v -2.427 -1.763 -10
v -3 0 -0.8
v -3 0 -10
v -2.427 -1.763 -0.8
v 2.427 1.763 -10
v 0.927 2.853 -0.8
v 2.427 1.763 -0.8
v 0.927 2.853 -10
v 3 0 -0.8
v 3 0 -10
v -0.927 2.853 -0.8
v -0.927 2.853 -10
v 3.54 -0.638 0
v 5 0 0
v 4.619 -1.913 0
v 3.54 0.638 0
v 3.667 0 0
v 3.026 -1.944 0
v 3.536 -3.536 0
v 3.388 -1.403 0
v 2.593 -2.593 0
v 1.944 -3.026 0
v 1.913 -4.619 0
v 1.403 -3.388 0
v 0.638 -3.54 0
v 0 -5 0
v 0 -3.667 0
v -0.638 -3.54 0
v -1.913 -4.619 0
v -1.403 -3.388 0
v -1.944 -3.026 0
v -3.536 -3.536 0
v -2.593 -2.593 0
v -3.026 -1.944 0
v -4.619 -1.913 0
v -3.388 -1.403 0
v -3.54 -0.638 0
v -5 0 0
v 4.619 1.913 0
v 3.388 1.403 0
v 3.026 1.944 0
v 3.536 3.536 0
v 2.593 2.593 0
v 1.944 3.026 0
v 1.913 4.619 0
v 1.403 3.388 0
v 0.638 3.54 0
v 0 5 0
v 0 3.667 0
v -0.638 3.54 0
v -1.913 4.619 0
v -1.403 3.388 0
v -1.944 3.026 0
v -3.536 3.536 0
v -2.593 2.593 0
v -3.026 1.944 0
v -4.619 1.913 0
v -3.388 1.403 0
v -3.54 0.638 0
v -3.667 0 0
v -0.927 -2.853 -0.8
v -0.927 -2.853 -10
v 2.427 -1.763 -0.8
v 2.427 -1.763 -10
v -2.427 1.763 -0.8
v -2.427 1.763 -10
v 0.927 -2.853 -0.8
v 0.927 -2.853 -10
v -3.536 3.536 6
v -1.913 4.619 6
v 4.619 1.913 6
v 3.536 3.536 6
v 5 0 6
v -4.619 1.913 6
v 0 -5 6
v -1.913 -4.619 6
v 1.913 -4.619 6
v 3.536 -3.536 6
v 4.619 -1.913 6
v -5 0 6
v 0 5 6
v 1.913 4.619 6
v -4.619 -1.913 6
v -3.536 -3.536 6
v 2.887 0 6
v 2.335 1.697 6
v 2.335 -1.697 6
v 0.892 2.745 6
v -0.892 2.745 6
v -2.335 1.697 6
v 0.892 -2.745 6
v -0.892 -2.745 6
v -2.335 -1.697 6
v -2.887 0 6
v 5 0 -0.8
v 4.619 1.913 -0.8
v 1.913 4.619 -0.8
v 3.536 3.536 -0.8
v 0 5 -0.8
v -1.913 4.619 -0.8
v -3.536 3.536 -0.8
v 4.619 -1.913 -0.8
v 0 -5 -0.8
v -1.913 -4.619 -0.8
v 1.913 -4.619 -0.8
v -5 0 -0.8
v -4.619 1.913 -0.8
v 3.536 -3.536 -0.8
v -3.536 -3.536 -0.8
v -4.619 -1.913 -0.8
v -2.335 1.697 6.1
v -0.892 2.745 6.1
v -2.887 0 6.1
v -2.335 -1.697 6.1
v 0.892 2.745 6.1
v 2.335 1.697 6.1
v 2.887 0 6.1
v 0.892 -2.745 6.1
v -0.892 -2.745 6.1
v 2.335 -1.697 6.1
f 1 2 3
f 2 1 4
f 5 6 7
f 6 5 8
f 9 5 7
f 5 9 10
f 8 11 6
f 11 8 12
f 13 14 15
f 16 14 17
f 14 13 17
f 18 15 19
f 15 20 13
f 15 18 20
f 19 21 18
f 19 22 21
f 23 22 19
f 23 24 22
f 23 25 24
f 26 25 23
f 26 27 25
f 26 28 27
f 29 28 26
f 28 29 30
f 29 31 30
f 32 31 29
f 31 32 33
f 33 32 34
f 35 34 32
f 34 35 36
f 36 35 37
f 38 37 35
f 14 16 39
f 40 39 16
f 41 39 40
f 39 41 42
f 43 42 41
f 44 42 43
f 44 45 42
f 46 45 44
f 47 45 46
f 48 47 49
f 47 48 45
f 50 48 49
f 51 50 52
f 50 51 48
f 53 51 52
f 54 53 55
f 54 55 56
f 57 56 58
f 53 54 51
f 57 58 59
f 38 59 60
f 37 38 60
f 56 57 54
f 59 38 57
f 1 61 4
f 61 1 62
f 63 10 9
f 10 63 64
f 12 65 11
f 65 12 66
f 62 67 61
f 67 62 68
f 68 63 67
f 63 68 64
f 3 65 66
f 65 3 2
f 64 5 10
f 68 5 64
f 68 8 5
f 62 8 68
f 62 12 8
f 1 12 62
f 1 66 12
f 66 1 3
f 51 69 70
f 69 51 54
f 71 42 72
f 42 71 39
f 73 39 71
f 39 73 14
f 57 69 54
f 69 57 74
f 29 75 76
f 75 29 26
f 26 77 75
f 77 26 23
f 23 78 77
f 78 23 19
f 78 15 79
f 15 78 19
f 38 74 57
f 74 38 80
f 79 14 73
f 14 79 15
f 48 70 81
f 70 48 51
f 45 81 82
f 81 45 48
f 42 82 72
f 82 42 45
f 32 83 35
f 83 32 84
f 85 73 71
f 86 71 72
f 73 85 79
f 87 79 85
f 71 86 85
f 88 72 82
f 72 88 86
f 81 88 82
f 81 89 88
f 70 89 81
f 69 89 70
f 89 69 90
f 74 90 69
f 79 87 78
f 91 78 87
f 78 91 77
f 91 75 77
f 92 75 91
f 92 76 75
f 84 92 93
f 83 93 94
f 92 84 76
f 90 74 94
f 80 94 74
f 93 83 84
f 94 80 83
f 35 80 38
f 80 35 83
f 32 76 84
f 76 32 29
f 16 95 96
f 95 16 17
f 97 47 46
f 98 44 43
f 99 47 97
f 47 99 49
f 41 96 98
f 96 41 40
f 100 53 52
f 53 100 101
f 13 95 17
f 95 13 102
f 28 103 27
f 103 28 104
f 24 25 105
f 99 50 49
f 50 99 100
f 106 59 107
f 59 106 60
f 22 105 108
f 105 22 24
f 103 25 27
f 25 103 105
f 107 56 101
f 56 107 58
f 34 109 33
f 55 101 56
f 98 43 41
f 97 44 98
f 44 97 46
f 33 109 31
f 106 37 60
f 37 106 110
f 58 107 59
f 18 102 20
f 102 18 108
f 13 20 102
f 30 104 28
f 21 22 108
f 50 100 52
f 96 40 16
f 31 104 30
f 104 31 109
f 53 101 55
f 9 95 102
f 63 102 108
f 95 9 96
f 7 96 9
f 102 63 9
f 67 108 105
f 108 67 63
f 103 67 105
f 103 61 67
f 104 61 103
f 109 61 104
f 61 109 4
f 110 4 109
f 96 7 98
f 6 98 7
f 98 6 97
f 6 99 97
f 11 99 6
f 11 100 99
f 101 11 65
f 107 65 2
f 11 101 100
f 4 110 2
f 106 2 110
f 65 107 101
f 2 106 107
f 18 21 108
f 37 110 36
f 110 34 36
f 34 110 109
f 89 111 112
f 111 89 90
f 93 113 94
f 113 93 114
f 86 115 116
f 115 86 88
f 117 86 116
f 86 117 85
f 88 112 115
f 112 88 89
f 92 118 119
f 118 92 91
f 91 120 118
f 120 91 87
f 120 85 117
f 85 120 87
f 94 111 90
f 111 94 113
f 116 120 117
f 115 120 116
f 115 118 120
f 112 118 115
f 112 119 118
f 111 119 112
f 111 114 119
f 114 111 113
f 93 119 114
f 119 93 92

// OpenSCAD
// Parameters
shaft_diameter_mm = 6; //[3:12:0.1]
length_under_head_mm = 10; //[5:20:0.5]
head_diameter_mm = 10; //[6:20:0.1]
head_height_mm = 6; //[3:12:0.1]
socket_across_flats_mm = 5; //[3:8:0.1]
socket_depth_mm = 4; //[2:6:0.1]
threaded = 1; //[0:1:1]
thread_pitch_mm = 1; //[0.5:2:0.1]
thread_depth_mm = 0.3; //[0.1:0.8:0.05]
under_head_fillet_height_mm = 1.2; //[0.6:2.4:0.1]
overlap_mm = 0.8; //[0.2:2:0.1]
eps_mm = 0.2; //[0.05:0.5:0.05]
placeholder_size_mm = 0.01; //[0.001:0.1:0.001]

// Pin Socket - Detailed Geometry
module pin_socket() {
  color("Silver") {
    // Placeholder for pin socket geometry
    translate([0, 0, -length_under_head_mm + placeholder_size_mm/2])
      cube([placeholder_size_mm, placeholder_size_mm, placeholder_size_mm], center=true);
  }
}

// Screw And Washer - Detailed Geometry
module screw_and_washer() {
  color("DimGray") {
    // Placeholder for screw and washer geometry
    translate([0, 0, head_height_mm - placeholder_size_mm/2])
      cube([placeholder_size_mm, placeholder_size_mm, placeholder_size_mm], center=true);
  }
}

// PCB Spacer - Detailed Geometry
module pcb_spacer() {
  color("Black") {
    // Placeholder for PCB spacer geometry
    translate([0, 0, -length_under_head_mm/2])
      cube([placeholder_size_mm, placeholder_size_mm, placeholder_size_mm], center=true);
  }
}

// Buzzer - Detailed Geometry
module buzzer() {
  color("Copper") {
    // Placeholder for buzzer geometry
    translate([0, 0, head_height_mm/2])
      cube([placeholder_size_mm, placeholder_size_mm, placeholder_size_mm], center=true);
  }
}

// Screw with Thread and Socket
module screw_with_thread_and_socket() {
  color("Steel") {
    // Cap Head
    translate([0, 0, head_height_mm/2])
      cylinder(h=head_height_mm, r=head_diameter_mm/2, center=true);

    // Shaft
    translate([0, 0, -length_under_head_mm/2])
      cylinder(h=length_under_head_mm, r=shaft_diameter_mm/2, center=true);

    // Under Head Fillet or Chamfer
    translate([0, 0, -under_head_fillet_height_mm/2 + overlap_mm/2])
      cylinder(h=under_head_fillet_height_mm, r1=head_diameter_mm/2, r2=shaft_diameter_mm/2, center=true);

    // Hex Socket Recess
    translate([0, 0, head_height_mm - socket_depth_mm/2])
      rotate([0, 0, 0])
      cylinder(h=socket_depth_mm + eps_mm, r=socket_across_flats_mm/(2*cos(30)), center=true);

    // Thread Representation
    if (threaded) {
      difference() {
        translate([0, 0, -length_under_head_mm/2])
          cylinder(h=length_under_head_mm, r=shaft_diameter_mm/2, center=true);
        translate([0, 0, -length_under_head_mm/2])
          cylinder(h=length_under_head_mm, r=shaft_diameter_mm/2 - thread_depth_mm, center=true);
      }
    }
  }
}

// Assembly
module assembly() {
  screw_with_thread_and_socket();
  pin_socket();
  screw_and_washer();
  pcb_spacer();
  buzzer();
}

assembly();
